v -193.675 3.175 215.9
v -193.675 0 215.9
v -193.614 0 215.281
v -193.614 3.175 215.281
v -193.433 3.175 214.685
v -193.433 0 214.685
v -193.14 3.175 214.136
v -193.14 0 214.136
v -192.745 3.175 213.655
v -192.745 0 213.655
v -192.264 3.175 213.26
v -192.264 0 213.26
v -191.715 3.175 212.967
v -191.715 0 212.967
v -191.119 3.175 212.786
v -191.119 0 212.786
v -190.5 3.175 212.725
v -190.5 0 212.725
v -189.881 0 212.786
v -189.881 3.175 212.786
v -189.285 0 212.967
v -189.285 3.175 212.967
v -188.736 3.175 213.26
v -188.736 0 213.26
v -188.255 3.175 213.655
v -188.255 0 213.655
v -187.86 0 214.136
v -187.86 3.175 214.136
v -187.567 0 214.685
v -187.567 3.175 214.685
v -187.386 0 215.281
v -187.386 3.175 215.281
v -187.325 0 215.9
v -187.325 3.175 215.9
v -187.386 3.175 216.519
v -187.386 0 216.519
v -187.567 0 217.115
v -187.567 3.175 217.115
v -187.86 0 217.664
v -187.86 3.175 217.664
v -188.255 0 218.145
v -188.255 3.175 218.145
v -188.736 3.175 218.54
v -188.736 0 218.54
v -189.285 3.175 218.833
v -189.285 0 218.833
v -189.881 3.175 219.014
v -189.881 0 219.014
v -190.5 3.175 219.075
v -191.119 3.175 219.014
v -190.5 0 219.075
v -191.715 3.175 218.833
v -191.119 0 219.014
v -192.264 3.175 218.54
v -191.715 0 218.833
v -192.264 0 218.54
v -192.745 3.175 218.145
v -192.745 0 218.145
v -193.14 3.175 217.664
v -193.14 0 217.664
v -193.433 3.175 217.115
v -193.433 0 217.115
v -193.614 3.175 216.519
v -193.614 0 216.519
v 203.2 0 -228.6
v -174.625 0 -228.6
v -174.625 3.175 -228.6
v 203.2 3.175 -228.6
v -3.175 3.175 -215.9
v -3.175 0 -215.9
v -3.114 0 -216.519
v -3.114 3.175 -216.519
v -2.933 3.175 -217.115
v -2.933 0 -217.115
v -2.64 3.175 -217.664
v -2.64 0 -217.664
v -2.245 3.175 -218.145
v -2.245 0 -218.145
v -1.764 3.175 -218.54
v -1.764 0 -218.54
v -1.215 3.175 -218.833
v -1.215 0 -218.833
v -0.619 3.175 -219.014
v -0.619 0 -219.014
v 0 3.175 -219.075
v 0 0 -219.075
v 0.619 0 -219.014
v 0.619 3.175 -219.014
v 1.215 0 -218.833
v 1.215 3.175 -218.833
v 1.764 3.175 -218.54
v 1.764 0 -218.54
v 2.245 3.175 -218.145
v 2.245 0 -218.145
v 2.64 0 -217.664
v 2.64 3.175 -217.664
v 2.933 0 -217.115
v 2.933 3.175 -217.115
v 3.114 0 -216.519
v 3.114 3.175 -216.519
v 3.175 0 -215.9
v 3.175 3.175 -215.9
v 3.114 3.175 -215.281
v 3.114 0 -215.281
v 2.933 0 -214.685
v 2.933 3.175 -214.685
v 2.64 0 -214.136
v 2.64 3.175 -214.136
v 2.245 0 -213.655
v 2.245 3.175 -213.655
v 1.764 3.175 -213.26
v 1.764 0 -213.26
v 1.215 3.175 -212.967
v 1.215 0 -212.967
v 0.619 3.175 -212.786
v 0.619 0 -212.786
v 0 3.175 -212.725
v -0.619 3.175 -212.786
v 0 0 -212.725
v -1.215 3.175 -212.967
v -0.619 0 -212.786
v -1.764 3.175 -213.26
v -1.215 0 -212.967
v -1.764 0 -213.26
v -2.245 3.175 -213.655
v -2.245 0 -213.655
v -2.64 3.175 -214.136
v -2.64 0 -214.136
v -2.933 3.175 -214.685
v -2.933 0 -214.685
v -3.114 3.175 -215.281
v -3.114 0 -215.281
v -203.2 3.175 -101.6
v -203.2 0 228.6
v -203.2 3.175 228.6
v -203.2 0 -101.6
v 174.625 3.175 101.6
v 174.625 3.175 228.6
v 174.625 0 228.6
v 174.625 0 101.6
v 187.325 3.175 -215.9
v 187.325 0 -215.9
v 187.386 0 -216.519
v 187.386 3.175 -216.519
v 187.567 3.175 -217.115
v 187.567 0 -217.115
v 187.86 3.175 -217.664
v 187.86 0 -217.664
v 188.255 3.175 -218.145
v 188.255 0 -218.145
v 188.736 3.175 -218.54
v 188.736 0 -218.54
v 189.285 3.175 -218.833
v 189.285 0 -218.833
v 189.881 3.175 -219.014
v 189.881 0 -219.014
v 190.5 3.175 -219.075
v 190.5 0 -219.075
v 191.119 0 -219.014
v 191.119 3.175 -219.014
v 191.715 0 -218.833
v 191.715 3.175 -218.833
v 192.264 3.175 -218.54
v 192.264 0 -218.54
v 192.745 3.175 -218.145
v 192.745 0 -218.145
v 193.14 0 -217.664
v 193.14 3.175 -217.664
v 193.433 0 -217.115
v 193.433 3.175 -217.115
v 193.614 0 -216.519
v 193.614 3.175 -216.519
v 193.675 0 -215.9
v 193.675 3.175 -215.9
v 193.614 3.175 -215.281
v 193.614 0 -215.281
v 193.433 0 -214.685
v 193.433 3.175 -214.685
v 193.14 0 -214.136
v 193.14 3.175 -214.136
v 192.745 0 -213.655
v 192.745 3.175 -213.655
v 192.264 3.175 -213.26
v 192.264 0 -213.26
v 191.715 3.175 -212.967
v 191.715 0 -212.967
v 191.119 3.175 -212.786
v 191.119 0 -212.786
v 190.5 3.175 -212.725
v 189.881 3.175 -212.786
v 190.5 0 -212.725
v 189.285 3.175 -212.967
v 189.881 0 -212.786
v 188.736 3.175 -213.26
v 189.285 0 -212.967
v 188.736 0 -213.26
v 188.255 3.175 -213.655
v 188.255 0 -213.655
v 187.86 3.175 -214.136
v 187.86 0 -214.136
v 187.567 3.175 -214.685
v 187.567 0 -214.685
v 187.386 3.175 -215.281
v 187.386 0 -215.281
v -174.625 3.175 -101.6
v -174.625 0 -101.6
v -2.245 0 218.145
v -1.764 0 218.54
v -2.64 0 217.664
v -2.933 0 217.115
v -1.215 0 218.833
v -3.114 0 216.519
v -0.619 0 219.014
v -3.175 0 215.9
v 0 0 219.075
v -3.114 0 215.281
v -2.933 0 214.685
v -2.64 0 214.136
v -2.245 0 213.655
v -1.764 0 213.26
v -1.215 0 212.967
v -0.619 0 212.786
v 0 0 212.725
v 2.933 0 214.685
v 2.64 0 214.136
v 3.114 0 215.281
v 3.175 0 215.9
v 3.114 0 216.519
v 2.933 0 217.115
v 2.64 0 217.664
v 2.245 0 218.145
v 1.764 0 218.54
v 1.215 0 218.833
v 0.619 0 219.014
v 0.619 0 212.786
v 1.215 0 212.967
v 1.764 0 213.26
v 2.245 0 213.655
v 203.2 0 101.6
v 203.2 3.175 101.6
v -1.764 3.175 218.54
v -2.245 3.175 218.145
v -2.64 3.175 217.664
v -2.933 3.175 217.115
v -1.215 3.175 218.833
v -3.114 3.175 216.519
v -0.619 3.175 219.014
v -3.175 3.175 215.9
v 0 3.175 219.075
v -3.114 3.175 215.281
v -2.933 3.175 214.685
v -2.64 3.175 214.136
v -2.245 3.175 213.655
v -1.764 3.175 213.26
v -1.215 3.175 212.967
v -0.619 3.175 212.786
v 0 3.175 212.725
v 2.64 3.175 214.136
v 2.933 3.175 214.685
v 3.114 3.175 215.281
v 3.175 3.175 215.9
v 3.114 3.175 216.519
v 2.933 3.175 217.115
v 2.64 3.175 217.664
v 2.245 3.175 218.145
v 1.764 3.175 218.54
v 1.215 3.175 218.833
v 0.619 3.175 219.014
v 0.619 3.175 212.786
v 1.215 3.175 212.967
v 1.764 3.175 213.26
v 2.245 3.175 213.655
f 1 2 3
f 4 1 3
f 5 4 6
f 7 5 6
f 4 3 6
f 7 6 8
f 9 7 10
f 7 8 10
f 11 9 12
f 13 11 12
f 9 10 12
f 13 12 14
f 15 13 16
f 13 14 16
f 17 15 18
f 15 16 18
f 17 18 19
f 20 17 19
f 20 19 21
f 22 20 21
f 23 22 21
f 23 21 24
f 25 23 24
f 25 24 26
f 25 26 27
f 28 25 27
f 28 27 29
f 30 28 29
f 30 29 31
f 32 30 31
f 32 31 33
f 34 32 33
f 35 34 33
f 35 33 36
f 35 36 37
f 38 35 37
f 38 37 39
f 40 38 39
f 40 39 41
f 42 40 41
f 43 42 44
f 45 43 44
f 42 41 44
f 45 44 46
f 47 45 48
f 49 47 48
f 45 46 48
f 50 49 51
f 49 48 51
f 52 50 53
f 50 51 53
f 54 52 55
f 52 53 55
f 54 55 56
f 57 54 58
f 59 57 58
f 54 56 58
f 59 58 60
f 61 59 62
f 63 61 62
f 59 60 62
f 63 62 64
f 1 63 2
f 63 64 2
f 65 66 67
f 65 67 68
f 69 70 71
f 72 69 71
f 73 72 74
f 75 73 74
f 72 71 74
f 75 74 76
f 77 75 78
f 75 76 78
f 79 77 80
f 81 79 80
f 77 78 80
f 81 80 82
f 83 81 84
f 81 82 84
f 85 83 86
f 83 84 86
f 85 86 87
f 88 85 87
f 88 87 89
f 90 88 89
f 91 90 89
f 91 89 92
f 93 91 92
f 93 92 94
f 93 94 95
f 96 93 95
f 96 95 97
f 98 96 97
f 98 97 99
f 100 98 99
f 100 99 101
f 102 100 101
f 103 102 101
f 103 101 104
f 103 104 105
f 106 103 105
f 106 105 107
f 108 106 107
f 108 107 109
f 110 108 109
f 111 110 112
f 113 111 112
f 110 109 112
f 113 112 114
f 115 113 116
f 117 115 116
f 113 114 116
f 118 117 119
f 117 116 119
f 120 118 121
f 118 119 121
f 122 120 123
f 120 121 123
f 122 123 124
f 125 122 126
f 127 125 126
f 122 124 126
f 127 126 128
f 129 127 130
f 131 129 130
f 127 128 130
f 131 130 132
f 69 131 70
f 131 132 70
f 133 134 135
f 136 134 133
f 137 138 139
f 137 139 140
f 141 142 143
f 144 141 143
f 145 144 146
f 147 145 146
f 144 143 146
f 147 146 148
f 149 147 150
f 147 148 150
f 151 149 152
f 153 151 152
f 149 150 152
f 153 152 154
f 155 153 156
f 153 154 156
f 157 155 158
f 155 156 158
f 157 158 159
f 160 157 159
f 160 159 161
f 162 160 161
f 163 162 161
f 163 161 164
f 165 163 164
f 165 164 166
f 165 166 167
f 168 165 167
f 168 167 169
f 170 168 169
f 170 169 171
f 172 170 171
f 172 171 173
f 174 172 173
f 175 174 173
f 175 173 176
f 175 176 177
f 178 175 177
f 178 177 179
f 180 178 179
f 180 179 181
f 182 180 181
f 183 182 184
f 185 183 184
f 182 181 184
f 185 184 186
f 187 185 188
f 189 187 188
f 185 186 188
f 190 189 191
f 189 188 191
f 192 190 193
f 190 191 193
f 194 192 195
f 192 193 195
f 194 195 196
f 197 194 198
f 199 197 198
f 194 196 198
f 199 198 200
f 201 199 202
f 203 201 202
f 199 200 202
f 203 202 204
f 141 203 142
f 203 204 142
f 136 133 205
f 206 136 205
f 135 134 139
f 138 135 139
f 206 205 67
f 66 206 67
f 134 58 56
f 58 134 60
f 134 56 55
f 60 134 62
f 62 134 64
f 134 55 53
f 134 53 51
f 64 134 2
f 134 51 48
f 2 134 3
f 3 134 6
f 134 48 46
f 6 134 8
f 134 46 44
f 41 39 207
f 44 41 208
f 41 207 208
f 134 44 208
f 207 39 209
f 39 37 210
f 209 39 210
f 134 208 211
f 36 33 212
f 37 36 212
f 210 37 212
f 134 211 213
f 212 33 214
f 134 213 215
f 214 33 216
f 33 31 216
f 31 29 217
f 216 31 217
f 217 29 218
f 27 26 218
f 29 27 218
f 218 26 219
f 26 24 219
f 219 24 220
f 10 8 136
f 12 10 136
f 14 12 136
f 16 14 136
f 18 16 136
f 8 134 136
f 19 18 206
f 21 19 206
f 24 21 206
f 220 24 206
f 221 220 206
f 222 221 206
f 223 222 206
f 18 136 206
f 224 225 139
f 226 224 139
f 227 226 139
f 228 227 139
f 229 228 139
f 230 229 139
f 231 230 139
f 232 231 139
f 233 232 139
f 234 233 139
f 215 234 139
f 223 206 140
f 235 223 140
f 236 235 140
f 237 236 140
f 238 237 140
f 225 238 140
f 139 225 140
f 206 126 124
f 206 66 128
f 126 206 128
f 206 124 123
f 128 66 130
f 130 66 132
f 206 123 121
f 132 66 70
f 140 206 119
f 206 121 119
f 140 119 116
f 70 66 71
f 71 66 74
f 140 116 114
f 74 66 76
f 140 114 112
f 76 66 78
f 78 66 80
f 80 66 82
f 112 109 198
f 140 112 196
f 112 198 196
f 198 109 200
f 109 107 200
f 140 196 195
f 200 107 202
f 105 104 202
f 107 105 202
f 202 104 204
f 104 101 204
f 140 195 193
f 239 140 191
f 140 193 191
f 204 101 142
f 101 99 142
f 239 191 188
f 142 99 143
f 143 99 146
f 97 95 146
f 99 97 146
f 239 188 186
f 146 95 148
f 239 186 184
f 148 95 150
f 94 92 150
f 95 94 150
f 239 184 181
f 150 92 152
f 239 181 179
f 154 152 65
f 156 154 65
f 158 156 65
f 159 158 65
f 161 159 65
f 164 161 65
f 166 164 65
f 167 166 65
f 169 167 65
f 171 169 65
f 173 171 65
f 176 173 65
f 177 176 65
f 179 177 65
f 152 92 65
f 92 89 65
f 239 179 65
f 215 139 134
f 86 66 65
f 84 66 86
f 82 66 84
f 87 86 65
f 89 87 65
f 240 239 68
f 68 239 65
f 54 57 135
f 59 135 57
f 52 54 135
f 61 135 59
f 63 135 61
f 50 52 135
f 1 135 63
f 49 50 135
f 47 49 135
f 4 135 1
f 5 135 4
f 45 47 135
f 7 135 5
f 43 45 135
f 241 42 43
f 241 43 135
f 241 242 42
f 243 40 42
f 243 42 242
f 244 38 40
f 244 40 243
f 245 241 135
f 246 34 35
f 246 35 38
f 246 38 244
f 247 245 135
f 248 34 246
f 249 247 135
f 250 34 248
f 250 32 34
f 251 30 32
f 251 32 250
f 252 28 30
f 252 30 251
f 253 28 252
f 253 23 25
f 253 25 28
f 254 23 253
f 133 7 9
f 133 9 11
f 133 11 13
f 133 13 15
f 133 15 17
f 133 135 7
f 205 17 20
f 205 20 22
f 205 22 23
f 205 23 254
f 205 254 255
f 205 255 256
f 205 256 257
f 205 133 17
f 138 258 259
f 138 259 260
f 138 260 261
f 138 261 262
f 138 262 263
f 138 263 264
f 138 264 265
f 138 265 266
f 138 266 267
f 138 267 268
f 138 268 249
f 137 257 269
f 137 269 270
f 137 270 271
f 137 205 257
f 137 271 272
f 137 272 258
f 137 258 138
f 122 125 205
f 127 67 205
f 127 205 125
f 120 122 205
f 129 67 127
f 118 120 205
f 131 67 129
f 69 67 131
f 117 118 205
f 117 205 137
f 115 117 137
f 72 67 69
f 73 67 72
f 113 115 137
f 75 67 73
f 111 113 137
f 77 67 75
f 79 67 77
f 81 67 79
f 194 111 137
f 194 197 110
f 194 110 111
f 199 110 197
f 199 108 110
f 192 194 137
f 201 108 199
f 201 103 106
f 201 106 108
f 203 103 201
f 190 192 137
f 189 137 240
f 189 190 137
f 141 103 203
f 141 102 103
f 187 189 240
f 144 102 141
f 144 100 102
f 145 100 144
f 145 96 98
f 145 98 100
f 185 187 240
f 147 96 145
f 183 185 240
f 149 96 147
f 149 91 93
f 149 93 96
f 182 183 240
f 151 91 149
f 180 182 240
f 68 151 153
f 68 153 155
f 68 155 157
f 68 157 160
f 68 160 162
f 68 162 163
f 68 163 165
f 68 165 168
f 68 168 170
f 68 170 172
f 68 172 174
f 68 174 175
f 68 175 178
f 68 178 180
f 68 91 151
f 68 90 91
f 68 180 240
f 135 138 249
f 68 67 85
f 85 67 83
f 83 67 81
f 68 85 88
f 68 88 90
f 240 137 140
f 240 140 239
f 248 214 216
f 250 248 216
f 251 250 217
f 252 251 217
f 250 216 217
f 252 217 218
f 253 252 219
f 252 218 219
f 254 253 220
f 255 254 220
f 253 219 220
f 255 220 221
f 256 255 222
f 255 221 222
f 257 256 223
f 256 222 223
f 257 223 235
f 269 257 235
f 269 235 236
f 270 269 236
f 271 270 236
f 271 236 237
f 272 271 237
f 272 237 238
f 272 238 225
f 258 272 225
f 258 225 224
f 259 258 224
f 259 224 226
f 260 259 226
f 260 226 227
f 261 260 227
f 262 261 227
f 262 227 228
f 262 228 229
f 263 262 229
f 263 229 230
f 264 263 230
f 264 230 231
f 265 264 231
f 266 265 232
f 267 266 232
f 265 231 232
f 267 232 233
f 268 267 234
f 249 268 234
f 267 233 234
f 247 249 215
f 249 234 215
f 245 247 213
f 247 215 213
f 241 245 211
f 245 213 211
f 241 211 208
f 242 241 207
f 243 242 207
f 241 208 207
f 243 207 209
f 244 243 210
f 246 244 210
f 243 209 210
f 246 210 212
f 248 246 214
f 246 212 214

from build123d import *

# Parameters (mm, degrees)
SKETCH1_W                   = 406.4
SKETCH1_H                   = 457.2
BOSS_EXTRUDE1_DEPTH         = 3.175
CUT_EXTRUDE1_REACH          = 307.873
SKETCH2_W                   = 28.575
SKETCH2_H                   = 127
F_1_4_0_25_DIAMETER_HOLE1_D = 6.35


with BuildPart() as part:
    # Sketch1 → Boss-Extrude1 (new body)
    with BuildSketch(Plane(origin=(0, 0, 0), x_dir=(1, 0, 0), z_dir=(0, 1, 0))):
        Rectangle(SKETCH1_W, SKETCH1_H)
    extrude(amount=BOSS_EXTRUDE1_DEPTH)

    # Sketch2 → Cut-Extrude1 (cut, up to next)
    with BuildSketch(Plane(origin=(0, 3.175, 0), x_dir=(1, 0, 0), z_dir=(0, 1, 0)), mode=Mode.PRIVATE) as cut_extrude1_sk1:
        with Locations((-188.9125, 165.1)):
            Rectangle(SKETCH2_W, SKETCH2_H)
    cut_extrude1_tool1 = extrude(cut_extrude1_sk1.sketch, amount=-CUT_EXTRUDE1_REACH, mode=Mode.PRIVATE) & part.part
    # Sketch2 → Cut-Extrude1 (cut, up to next)
    with BuildSketch(Plane(origin=(0, 3.175, 0), x_dir=(1, 0, 0), z_dir=(0, 1, 0)), mode=Mode.PRIVATE) as cut_extrude1_sk2:
        with Locations((188.9125, -165.1)):
            Rectangle(SKETCH2_W, SKETCH2_H)
    cut_extrude1_tool2 = extrude(cut_extrude1_sk2.sketch, amount=-CUT_EXTRUDE1_REACH, mode=Mode.PRIVATE) & part.part
    add(cut_extrude1_tool1.solids().sort_by_distance((-188.9125, 3.175, -165.1))[0], mode=Mode.SUBTRACT)
    add(cut_extrude1_tool2.solids().sort_by_distance((188.9125, 3.175, 165.1))[0], mode=Mode.SUBTRACT)

    # 1/4 (0.25) Diameter Hole1 (through all)
    with Locations(Plane(origin=(0, 3.175, 0), x_dir=(1, 0, 0), z_dir=(0, 1, 0))):
        with Locations((-190.5, -215.9), (190.5, 215.9), (0, 215.9), (0, -215.9)):
            Hole(F_1_4_0_25_DIAMETER_HOLE1_D / 2)


solid = part.part
